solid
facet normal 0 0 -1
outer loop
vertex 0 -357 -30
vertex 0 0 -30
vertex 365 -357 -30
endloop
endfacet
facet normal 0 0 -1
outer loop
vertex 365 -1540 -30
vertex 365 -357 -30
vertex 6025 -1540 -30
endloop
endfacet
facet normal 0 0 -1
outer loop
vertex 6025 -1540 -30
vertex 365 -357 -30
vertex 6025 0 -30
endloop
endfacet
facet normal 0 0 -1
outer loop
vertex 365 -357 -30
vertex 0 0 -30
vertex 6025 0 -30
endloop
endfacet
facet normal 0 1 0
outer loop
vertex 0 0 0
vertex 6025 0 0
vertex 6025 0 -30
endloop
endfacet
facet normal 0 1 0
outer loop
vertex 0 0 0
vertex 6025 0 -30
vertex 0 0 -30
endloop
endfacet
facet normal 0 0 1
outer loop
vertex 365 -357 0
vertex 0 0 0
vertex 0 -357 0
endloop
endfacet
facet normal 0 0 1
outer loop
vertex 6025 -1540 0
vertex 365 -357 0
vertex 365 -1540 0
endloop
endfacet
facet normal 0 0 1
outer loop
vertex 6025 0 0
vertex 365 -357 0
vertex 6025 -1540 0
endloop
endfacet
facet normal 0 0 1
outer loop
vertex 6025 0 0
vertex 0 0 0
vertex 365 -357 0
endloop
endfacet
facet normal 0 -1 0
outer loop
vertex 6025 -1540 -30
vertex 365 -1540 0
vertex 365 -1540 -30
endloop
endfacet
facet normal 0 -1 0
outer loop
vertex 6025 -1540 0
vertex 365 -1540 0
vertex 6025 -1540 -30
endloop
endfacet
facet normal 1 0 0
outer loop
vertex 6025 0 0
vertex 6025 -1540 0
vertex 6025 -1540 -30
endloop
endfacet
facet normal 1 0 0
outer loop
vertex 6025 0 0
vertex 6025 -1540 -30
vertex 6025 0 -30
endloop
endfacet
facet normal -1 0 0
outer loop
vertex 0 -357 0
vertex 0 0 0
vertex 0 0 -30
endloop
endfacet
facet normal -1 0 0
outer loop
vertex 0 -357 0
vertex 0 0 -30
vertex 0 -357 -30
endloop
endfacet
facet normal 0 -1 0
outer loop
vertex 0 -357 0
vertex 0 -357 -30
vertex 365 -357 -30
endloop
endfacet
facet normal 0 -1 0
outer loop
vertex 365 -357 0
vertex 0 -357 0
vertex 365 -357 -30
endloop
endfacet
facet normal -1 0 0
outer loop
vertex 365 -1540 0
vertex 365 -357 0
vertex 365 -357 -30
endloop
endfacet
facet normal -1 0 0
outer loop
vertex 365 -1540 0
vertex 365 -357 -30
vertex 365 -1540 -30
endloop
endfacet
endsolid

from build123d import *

# Parameters (mm, degrees)
TABAN_FLAN_1_DEPTH         = 30
KES_EKSTR_ZYON1_DEPTH      = 6219.771984886
KES_EKSTR_ZYON1_DEPTH_BACK = 6219.771984886
IZIM2_W                    = 365
IZIM2_H                    = 658


# Sheet-metal steps are written as plain solids
with BuildPart() as part:
    # Çizim1 → Taban-Flanş1 (new body)
    with BuildSketch(Plane.XY):
        Polygon((0, 0), (0, -1015), (365, -1015), (365, -1540), (6025, -1540), (6025, 0), align=None)
    extrude(amount=-TABAN_FLAN_1_DEPTH)

    # Çizim2 → Kes-Ekstrüzyon1 (cut, two sides: drawn at the far end of the back side and taken through both)
    with BuildSketch(Plane.XY.offset(-KES_EKSTR_ZYON1_DEPTH_BACK)):
        with Locations((182.5, -686)):
            Rectangle(IZIM2_W, IZIM2_H)
    extrude(amount=KES_EKSTR_ZYON1_DEPTH + KES_EKSTR_ZYON1_DEPTH_BACK, mode=Mode.SUBTRACT)


solid = part.part
